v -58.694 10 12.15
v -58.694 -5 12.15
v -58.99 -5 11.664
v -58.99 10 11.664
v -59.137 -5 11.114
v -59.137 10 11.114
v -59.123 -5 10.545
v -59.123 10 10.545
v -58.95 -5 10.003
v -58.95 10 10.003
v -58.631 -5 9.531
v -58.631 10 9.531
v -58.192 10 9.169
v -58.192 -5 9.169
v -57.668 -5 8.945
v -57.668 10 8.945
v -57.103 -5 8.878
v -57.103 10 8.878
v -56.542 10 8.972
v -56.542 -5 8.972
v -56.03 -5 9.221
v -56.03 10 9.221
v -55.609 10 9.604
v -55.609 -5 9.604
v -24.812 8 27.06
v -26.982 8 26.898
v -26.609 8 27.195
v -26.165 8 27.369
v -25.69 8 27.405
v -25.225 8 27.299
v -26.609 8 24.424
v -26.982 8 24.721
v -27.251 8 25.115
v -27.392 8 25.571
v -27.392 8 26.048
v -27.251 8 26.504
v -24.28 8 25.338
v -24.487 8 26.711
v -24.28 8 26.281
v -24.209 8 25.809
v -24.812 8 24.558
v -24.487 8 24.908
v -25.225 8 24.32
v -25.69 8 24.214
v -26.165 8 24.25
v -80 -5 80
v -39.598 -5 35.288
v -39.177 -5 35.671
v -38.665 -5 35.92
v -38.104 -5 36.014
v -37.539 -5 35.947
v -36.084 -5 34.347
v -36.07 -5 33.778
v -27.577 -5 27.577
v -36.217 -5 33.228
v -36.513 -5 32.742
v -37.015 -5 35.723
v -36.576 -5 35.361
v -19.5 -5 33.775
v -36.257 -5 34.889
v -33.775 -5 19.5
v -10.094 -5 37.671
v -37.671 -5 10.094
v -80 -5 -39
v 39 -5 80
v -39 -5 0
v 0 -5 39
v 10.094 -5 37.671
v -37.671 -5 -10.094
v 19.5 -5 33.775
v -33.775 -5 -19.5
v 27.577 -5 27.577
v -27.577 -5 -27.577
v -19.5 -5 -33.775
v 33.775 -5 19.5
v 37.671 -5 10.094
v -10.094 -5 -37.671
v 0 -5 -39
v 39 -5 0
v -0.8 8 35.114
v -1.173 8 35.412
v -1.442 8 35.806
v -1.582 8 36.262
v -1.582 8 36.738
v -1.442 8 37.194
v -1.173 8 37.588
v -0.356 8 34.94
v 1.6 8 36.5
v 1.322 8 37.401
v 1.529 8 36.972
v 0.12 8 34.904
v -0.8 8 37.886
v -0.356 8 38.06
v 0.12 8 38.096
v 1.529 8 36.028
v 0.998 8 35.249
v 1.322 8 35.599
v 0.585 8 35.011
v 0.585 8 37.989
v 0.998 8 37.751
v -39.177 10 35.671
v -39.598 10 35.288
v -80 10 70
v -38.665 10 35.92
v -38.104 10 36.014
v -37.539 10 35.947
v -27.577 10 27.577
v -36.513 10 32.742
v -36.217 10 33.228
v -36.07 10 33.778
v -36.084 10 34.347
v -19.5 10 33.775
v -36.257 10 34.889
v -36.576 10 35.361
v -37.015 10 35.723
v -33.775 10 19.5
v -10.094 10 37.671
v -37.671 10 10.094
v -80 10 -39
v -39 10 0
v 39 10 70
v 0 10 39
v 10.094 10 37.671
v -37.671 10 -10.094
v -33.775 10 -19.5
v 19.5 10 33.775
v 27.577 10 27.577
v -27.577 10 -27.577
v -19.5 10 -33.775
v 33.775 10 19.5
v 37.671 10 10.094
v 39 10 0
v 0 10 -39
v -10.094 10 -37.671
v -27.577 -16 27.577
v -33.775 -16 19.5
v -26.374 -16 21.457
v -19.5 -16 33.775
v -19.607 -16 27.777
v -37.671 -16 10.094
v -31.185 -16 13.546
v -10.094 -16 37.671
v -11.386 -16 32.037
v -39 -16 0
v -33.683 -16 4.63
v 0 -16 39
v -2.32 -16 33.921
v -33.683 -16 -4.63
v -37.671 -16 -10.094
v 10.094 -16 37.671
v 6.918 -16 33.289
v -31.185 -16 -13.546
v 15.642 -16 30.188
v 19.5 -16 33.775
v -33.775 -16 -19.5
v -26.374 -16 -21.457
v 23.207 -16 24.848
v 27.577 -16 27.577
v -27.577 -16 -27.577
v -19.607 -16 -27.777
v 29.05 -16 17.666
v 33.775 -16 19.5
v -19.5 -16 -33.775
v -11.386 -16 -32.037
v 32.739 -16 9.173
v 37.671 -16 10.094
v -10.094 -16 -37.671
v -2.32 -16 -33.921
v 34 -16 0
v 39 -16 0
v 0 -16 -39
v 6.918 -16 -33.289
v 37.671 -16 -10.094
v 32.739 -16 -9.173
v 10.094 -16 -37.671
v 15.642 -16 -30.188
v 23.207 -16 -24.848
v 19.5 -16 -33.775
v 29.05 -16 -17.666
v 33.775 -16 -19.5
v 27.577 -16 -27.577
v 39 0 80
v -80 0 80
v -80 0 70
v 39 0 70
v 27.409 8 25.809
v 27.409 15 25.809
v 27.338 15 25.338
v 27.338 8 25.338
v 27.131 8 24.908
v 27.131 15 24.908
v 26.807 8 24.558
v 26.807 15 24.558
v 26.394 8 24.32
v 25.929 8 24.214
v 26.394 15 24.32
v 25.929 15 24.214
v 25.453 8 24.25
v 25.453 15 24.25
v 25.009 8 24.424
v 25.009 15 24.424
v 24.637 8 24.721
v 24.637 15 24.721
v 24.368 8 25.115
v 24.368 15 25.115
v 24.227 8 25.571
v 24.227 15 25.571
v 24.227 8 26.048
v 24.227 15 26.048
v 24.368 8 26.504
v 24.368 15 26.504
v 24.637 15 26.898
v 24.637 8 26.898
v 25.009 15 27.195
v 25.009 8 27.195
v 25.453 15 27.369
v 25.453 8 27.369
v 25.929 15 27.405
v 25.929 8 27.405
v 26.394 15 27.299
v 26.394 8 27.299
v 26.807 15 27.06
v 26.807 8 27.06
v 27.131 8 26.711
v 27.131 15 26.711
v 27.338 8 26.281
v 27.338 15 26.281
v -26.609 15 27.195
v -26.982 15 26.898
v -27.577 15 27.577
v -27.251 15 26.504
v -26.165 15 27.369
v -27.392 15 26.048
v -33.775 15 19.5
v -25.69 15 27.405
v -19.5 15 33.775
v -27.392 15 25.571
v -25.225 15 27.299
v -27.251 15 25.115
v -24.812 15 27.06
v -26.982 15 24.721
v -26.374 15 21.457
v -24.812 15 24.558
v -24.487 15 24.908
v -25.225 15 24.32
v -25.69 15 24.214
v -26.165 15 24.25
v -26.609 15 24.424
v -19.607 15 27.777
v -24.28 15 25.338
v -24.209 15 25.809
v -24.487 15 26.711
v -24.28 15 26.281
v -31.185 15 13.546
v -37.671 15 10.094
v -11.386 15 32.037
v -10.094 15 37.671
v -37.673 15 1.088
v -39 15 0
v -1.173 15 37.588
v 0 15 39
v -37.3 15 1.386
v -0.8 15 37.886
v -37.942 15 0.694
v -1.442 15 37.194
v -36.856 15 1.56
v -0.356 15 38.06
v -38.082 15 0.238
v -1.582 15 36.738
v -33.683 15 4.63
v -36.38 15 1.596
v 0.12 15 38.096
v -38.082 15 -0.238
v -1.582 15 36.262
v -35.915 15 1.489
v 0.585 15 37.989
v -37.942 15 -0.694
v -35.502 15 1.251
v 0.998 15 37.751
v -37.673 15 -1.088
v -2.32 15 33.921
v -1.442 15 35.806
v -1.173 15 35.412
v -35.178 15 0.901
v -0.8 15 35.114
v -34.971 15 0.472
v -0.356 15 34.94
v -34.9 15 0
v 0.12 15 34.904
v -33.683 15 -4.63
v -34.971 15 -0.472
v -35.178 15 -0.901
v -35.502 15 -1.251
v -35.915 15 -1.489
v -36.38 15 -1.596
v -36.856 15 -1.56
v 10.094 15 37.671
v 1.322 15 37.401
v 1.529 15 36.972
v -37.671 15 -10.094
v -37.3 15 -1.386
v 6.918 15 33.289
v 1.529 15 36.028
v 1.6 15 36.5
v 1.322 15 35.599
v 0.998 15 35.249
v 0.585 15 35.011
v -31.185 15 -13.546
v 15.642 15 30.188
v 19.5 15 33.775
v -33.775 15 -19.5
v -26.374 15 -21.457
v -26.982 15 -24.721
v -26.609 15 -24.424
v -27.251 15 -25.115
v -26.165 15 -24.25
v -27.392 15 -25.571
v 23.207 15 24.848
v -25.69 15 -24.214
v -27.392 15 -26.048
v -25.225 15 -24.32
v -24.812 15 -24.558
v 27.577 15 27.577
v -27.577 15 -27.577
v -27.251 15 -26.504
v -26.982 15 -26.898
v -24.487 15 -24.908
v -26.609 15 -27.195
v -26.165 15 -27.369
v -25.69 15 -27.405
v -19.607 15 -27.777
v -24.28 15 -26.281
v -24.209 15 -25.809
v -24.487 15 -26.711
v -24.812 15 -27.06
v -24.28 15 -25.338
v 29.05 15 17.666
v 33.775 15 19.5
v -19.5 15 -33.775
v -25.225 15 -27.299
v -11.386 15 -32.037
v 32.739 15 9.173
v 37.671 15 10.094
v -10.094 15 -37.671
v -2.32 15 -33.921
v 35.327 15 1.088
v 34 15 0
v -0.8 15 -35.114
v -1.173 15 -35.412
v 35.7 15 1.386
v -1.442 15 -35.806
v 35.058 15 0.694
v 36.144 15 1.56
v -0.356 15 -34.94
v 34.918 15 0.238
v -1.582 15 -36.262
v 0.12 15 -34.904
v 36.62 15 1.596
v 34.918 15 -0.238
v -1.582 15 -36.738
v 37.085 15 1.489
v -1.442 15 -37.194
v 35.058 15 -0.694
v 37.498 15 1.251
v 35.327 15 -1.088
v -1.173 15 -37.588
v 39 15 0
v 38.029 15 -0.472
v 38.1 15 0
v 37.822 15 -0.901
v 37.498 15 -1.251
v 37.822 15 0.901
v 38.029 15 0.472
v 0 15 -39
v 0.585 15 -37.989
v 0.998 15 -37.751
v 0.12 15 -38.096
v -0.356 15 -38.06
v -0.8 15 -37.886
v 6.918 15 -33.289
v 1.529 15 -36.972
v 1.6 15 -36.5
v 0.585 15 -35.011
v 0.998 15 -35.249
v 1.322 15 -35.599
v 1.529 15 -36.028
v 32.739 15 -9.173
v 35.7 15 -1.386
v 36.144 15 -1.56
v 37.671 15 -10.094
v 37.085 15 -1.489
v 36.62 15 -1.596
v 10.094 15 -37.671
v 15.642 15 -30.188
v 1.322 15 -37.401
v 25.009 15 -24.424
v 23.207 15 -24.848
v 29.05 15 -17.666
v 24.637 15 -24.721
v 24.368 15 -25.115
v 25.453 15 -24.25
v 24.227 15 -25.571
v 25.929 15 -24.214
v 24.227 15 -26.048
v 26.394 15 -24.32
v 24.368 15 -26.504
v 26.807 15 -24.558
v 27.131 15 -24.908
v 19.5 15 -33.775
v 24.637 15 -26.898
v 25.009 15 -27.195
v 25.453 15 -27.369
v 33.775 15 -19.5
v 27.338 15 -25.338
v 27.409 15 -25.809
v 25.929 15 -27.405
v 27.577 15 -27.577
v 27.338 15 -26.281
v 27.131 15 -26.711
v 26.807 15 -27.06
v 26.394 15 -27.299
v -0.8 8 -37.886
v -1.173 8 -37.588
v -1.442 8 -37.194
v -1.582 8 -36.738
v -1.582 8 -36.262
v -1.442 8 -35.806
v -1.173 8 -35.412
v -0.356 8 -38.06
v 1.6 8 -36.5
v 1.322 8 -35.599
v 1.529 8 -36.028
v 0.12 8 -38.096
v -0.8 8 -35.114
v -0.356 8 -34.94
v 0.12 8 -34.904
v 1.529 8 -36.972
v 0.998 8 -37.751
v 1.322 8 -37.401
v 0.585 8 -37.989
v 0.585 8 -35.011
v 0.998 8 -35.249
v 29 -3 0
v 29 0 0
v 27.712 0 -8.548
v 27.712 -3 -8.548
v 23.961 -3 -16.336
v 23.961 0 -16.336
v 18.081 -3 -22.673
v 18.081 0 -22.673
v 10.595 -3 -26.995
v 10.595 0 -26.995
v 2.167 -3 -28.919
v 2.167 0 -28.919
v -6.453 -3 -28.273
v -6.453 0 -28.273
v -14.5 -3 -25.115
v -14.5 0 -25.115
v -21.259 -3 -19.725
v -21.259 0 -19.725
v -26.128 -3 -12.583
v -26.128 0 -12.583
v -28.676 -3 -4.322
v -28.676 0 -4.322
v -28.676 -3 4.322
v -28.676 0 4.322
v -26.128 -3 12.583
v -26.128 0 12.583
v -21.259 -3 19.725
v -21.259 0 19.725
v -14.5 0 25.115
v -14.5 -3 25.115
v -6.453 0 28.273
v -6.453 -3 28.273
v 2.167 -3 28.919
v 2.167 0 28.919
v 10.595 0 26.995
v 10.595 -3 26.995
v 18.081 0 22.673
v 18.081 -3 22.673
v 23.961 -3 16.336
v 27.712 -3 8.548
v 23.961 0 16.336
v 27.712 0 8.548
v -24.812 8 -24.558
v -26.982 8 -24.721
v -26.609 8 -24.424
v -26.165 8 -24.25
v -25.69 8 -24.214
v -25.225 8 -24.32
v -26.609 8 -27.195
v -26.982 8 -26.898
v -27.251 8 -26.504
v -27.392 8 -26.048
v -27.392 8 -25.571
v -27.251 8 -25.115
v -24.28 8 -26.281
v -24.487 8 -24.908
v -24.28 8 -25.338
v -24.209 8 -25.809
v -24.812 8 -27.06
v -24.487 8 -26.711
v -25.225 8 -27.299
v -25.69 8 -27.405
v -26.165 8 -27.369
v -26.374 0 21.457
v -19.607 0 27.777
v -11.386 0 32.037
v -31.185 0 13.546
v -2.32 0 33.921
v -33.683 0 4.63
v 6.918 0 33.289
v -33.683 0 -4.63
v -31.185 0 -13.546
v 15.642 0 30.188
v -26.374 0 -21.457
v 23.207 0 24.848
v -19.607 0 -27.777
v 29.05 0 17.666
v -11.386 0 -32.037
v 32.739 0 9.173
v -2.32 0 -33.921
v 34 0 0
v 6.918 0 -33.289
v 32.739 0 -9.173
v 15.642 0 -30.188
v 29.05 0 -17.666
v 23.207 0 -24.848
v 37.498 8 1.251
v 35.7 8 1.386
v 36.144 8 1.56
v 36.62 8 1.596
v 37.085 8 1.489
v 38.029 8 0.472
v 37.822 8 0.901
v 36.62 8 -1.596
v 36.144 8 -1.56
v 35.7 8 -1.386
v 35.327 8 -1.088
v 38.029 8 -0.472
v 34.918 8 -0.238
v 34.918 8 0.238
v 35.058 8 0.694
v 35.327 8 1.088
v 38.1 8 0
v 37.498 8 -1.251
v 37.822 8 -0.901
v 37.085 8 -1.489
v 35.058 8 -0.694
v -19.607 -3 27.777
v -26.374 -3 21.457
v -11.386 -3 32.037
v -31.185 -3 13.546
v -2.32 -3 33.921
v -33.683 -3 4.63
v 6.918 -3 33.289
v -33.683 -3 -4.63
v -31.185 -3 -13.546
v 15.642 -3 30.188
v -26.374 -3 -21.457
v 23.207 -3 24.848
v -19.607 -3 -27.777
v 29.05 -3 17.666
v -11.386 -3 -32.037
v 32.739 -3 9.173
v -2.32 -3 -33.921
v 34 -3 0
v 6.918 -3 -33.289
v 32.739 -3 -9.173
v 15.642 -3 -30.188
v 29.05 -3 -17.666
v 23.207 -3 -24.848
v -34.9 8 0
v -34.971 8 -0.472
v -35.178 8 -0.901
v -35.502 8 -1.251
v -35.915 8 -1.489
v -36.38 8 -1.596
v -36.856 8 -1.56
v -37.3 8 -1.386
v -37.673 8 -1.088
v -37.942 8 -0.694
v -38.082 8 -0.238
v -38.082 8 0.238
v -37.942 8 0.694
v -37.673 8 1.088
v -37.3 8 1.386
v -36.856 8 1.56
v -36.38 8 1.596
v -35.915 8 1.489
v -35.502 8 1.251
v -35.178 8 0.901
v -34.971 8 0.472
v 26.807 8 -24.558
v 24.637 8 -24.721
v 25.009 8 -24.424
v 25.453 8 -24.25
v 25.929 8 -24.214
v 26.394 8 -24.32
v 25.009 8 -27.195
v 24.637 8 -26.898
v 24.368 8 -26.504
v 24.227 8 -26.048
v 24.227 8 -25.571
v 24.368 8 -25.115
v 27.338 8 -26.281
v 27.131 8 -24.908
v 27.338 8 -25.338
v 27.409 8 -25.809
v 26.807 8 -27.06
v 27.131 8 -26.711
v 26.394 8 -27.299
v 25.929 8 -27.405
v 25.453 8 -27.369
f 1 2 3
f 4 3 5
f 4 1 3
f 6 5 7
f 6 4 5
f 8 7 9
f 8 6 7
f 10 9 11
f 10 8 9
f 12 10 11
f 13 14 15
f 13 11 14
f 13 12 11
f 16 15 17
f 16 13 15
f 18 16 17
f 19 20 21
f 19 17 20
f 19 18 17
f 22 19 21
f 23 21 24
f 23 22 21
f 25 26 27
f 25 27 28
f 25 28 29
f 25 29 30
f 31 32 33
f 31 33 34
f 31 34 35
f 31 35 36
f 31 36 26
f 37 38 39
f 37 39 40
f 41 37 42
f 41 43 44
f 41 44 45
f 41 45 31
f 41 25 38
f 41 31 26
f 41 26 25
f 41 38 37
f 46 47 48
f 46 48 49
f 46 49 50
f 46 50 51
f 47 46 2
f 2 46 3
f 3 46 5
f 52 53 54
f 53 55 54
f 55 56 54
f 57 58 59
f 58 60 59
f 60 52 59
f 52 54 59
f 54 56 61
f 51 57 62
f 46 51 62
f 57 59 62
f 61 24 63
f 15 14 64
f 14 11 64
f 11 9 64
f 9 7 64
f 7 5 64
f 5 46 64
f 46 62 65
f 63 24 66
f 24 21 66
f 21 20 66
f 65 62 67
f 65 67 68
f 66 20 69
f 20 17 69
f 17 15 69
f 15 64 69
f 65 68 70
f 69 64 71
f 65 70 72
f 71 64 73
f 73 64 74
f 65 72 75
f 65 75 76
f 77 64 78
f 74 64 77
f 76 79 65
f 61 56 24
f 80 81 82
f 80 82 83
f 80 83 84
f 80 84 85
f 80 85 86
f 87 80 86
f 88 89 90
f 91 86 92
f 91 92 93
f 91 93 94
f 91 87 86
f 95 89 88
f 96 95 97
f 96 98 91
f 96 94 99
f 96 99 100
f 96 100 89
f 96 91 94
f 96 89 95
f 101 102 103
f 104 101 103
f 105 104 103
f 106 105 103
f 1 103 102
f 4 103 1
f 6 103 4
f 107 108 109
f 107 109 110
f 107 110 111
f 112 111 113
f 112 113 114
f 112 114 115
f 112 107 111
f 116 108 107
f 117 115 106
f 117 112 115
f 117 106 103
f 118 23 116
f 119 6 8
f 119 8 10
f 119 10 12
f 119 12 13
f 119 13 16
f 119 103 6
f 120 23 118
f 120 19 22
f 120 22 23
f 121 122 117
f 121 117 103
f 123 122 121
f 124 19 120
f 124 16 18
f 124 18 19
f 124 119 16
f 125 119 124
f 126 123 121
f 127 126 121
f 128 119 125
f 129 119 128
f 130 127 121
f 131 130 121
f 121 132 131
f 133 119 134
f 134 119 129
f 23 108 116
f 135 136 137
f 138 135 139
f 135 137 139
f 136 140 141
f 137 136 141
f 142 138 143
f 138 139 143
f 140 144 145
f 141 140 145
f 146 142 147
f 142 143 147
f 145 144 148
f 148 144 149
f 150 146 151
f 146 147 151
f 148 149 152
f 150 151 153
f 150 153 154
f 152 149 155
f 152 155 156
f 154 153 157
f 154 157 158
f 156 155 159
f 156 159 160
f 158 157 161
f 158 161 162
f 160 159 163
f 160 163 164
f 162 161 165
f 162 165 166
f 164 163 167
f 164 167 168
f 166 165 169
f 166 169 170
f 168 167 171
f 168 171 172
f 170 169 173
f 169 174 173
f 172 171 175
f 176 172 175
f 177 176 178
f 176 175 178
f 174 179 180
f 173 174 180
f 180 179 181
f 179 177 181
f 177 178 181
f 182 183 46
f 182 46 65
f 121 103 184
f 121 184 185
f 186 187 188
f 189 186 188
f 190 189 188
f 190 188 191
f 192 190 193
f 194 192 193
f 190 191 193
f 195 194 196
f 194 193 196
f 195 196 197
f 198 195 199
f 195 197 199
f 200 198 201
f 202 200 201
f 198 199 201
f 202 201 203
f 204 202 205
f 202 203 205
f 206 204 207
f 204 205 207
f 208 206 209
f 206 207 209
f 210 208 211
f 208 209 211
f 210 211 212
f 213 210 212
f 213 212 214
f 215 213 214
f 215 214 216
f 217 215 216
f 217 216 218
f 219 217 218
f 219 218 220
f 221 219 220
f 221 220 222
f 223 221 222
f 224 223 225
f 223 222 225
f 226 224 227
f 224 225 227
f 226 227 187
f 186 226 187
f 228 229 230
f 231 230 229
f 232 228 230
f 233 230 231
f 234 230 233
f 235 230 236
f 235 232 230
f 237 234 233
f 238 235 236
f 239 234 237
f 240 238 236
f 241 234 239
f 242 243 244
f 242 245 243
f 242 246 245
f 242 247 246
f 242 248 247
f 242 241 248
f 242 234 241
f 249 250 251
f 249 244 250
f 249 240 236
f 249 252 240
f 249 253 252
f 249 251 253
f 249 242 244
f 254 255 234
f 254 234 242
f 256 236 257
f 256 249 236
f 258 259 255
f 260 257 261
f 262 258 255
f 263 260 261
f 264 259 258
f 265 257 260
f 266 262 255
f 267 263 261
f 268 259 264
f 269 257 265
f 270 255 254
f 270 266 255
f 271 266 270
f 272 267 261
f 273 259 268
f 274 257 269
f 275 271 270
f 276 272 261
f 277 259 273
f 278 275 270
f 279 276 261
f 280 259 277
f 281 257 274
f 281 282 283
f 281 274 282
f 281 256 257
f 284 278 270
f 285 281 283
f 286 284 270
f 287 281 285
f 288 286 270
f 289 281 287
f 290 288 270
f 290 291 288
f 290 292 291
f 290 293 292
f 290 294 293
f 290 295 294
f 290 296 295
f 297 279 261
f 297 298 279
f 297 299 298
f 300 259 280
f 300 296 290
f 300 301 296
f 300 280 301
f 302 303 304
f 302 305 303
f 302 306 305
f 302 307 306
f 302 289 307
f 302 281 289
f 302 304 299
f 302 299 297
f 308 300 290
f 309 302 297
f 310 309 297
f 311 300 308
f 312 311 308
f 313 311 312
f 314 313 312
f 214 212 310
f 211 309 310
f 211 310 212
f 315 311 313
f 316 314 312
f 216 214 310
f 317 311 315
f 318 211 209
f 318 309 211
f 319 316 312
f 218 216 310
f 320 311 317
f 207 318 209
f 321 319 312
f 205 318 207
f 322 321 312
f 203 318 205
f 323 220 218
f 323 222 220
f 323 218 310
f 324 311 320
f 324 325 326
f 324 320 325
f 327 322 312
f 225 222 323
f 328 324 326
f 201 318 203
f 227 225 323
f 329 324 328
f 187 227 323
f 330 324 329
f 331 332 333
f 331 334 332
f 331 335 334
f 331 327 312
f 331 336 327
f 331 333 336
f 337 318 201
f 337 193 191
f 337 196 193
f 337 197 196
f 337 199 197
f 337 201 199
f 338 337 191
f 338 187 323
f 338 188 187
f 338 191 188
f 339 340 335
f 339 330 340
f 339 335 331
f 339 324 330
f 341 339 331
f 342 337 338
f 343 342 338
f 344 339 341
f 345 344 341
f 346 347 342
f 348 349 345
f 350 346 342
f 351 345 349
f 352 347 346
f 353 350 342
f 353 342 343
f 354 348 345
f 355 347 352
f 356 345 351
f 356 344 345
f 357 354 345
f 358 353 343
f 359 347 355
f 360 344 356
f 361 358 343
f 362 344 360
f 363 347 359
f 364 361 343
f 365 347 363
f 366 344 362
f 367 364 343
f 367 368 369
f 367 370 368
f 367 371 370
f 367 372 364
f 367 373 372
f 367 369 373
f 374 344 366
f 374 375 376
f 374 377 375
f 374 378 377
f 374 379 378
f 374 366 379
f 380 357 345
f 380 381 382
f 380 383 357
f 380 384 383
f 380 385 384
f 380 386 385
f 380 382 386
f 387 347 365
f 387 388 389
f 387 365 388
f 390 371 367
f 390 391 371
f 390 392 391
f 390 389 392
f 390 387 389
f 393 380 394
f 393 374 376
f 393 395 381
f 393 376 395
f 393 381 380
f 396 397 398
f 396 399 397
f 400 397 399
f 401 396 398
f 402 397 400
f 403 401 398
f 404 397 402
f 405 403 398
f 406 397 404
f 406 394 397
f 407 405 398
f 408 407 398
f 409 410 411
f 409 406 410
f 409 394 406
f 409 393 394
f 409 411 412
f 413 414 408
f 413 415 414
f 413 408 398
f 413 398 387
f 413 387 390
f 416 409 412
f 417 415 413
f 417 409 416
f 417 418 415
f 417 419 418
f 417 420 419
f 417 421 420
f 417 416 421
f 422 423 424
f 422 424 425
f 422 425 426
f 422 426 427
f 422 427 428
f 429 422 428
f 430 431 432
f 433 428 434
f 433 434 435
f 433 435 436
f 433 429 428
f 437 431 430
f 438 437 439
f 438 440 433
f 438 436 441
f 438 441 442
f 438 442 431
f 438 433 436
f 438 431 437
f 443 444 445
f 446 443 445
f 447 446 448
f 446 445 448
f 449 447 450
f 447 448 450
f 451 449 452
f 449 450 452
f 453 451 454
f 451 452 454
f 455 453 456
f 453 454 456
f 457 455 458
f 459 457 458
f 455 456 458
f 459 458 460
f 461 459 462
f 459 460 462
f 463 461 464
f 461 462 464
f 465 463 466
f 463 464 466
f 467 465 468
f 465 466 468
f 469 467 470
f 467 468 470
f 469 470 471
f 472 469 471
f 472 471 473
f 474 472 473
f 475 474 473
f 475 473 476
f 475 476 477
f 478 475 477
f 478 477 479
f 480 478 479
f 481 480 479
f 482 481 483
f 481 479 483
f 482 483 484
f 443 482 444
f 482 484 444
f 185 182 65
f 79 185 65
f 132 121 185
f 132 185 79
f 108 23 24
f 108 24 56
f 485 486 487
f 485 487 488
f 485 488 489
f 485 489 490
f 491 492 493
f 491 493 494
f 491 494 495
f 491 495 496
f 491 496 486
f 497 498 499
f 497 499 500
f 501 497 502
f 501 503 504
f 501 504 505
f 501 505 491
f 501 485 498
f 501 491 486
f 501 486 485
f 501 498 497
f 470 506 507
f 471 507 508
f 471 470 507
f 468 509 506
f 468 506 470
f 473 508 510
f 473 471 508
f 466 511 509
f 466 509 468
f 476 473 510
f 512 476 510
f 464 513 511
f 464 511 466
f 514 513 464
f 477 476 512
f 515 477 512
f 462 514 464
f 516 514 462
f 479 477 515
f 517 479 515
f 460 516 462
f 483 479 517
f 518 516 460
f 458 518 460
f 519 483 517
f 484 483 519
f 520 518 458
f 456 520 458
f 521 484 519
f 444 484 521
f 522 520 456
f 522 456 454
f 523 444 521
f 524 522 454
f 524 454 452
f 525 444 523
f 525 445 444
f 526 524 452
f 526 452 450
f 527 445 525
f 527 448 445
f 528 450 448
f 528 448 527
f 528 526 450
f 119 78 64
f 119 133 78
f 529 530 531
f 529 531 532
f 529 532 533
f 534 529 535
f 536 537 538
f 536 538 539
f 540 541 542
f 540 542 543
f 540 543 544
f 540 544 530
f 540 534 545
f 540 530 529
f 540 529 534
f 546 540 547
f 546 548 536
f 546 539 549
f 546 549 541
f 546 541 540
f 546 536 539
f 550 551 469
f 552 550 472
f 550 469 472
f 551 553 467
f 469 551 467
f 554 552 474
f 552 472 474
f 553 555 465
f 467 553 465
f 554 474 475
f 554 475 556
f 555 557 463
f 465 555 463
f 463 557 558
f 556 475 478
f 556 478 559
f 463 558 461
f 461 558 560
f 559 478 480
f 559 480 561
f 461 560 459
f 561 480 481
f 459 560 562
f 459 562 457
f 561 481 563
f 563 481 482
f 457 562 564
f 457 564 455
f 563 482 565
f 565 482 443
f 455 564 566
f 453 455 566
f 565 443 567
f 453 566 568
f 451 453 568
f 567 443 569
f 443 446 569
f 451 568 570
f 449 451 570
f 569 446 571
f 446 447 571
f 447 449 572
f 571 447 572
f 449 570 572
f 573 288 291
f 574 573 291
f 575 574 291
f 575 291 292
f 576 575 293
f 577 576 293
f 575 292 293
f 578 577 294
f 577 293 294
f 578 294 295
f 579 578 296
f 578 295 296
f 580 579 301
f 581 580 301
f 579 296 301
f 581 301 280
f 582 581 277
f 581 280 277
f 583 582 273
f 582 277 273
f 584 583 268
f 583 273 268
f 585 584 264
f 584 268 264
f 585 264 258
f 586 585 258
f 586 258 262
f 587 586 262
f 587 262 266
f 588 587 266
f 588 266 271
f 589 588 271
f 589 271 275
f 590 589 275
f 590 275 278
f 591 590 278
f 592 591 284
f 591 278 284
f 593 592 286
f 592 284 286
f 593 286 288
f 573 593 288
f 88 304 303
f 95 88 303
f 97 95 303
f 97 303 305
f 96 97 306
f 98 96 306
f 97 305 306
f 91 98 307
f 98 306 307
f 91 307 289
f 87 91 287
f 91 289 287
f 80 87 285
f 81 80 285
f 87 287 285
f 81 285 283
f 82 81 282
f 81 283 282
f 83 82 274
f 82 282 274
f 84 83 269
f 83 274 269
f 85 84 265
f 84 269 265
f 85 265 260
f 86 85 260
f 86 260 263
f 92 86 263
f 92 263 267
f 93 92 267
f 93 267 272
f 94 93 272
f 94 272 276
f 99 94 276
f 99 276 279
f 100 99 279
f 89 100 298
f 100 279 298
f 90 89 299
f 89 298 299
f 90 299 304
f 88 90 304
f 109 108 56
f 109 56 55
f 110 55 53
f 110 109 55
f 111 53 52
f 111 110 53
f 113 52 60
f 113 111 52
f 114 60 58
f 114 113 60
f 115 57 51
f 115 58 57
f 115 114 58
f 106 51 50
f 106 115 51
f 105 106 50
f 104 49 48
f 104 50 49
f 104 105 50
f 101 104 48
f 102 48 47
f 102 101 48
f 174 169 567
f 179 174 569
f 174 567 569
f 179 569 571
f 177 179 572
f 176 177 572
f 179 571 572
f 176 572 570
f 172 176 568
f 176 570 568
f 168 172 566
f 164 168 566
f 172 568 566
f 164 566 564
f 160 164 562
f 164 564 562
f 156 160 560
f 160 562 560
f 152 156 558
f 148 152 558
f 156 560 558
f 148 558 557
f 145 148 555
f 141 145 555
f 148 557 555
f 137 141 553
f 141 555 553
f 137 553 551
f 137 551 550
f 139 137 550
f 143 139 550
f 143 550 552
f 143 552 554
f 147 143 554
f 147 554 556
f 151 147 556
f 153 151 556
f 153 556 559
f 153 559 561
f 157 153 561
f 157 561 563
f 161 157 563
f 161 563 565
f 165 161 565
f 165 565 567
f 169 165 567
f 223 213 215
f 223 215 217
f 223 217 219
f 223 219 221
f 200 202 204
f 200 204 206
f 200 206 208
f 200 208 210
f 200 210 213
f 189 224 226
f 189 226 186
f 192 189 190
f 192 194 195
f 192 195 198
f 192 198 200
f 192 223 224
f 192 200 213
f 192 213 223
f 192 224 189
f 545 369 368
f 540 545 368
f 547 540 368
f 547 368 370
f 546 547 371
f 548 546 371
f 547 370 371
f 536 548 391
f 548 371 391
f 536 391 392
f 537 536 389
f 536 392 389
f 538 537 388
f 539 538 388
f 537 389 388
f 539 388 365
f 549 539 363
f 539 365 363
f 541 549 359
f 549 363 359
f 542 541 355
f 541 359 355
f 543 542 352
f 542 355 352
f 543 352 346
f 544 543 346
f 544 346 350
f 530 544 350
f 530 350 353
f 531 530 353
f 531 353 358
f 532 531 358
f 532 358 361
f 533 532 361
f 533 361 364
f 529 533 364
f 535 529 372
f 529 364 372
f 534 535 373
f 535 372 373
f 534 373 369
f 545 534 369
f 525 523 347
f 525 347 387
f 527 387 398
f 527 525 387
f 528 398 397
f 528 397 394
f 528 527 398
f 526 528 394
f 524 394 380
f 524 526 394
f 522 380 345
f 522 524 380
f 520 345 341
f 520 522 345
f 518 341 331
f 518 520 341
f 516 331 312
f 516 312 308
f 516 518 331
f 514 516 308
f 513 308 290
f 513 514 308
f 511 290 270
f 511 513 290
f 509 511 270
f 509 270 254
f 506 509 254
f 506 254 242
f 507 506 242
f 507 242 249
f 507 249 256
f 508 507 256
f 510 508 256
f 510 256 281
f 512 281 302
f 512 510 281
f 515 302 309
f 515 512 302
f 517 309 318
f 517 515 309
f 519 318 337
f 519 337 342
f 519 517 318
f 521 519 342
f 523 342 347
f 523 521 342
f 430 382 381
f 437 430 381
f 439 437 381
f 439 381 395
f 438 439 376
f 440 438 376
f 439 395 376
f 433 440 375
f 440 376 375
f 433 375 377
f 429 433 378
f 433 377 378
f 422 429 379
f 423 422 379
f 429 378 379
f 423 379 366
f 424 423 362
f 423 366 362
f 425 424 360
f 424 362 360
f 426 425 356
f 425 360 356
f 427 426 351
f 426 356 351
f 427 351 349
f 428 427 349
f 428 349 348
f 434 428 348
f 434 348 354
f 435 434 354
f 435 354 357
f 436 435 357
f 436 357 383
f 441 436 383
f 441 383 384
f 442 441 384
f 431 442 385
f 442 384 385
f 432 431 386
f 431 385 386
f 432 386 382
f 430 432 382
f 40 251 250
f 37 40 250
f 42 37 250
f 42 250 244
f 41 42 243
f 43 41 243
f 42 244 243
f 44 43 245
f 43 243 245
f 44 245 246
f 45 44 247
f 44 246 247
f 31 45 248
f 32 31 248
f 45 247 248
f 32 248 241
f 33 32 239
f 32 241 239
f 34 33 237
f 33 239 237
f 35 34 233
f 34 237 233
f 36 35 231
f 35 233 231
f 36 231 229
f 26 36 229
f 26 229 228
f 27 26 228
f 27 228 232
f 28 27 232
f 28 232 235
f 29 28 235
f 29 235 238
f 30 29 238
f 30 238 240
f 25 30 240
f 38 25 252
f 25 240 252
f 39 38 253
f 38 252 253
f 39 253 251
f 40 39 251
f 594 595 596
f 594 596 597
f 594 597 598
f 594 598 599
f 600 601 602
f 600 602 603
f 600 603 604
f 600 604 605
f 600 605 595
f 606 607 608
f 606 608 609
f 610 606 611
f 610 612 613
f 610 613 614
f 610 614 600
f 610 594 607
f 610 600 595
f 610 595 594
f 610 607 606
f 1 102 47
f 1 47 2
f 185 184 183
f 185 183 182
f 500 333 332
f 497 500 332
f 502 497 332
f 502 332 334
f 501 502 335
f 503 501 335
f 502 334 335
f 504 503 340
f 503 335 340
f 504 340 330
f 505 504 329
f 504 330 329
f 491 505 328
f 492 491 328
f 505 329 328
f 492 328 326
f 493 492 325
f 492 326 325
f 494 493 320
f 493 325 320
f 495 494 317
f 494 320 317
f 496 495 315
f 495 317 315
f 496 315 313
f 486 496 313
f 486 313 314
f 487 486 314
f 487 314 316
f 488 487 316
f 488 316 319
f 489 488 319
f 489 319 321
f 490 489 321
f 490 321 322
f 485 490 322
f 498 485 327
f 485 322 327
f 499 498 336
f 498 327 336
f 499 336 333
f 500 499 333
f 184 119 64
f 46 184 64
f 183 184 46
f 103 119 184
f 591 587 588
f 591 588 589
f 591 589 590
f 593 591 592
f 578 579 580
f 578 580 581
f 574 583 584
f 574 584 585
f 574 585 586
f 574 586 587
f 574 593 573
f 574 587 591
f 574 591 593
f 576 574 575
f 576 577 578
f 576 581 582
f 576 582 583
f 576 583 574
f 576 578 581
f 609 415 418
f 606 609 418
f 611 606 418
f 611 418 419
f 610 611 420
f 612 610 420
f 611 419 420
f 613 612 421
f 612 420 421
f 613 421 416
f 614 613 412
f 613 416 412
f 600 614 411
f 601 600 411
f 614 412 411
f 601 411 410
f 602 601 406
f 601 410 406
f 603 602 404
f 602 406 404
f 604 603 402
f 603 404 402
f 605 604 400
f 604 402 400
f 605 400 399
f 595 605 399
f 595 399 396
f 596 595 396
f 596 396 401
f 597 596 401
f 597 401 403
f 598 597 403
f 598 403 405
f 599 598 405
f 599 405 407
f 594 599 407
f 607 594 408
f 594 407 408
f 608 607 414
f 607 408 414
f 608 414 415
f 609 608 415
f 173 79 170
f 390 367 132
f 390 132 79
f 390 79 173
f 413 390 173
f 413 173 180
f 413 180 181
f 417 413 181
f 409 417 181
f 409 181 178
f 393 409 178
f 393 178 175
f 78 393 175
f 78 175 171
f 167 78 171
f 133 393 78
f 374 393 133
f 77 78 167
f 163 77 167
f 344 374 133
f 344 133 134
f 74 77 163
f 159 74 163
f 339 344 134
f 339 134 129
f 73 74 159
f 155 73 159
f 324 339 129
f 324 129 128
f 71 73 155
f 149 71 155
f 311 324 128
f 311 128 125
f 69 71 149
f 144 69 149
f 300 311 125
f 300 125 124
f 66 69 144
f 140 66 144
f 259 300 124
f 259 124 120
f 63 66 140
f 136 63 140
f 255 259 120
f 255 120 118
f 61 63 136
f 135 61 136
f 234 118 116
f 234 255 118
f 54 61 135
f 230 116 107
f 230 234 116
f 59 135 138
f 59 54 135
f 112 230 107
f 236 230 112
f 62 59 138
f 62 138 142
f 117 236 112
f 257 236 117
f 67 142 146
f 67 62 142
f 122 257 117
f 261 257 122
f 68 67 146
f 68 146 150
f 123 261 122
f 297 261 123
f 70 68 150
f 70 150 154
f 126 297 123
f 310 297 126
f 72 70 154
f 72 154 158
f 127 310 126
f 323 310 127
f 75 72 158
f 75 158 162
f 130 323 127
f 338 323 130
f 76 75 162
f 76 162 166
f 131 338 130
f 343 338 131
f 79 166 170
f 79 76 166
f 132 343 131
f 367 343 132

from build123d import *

# Parameters (mm, degrees)
SKETCH2_R                = 34
BOSS_EXTRUDE1_DEPTH      = 15
BOSS_EXTRUDE2_START      = -3
SKETCH2_3_R              = 39
SKETCH2_3_R_2            = 29
BOSS_EXTRUDE2_DEPTH      = 3
BOSS_EXTRUDE3_START      = -16
SKETCH2_4_R              = 34
BOSS_EXTRUDE3_DEPTH      = 16
BOSS_EXTRUDE4_DEPTH      = 10
BOSS_EXTRUDE4_DEPTH_BACK = 5
SKETCH3_W                = 119
SKETCH3_H                = 10
CUT_EXTRUDE1_DEPTH       = 10
SKETCH4_R                = 1.6
CUT_EXTRUDE2_DEPTH       = 7
CUT_EXTRUDE3_DEPTH       = 117.086174887


with BuildPart() as part:
    # Sketch2 → Boss-Extrude1 (new body)
    with BuildSketch(Plane(origin=(0, 0, 0), x_dir=(1, 0, 0), z_dir=(0, 1, 0))):
        with BuildLine():
            ThreePointArc((39, 0), (27.577164466, 27.577164466), (0, 39))
            ThreePointArc((0, 39), (-27.577164466, -27.577164466), (39, 0))
        make_face()
        Circle(SKETCH2_R, mode=Mode.SUBTRACT)
    extrude(amount=BOSS_EXTRUDE1_DEPTH)

    # Sketch2<3> → Boss-Extrude2 (add)
    with BuildSketch(Plane(origin=(0, 0, 0), x_dir=(1, 0, 0), z_dir=(0, 1, 0)).offset(BOSS_EXTRUDE2_START)):
        Circle(SKETCH2_3_R)
        Circle(SKETCH2_3_R_2, mode=Mode.SUBTRACT)
    extrude(amount=BOSS_EXTRUDE2_DEPTH)

    # Sketch2<4> → Boss-Extrude3 (add)
    with BuildSketch(Plane(origin=(0, 0, 0), x_dir=(1, 0, 0), z_dir=(0, 1, 0)).offset(BOSS_EXTRUDE3_START)):
        with BuildLine():
            ThreePointArc((39, 0), (27.577164466, 27.577164466), (0, 39))
            ThreePointArc((0, 39), (-27.577164466, -27.577164466), (39, 0))
        make_face()
        Circle(SKETCH2_4_R, mode=Mode.SUBTRACT)
    extrude(amount=BOSS_EXTRUDE3_DEPTH)

    # Sketch2<6> → Boss-Extrude4 (add, two sides: drawn at the far end of the back side and taken through both)
    with BuildSketch(Plane(origin=(0, 0, 0), x_dir=(1, 0, 0), z_dir=(0, 1, 0)).offset(-BOSS_EXTRUDE4_DEPTH_BACK)):
        with BuildLine():
            ThreePointArc((39, 0), (-27.577164466, -27.577164466), (0, 39))
            Line((0, 39), (-80, 39))
            Line((-80, 39), (-80, -80))
            Line((-80, -80), (0, -80))
            Line((0, -80), (39, -80))
            Line((39, -80), (39, 0))
        make_face()
    extrude(amount=BOSS_EXTRUDE4_DEPTH + BOSS_EXTRUDE4_DEPTH_BACK)

    # Sketch3 → Cut-Extrude1 (cut)
    with BuildSketch(Plane(origin=(0, 10, 0), x_dir=(1, 0, 0), z_dir=(0, 1, 0))):
        with Locations((-20.5, -75)):
            Rectangle(SKETCH3_W, SKETCH3_H)
    extrude(amount=-CUT_EXTRUDE1_DEPTH, mode=Mode.SUBTRACT)

    # Sketch4 → Cut-Extrude2 (cut)
    with BuildSketch(Plane(origin=(0, 15, 0), x_dir=(1, 0, 0), z_dir=(0, 1, 0))):
        with Locations((0, 36.5)):
            Circle(SKETCH4_R)
        with Locations((25.809397513, 25.809397513)):
            Circle(SKETCH4_R)
        with Locations((36.5, 0)):
            Circle(SKETCH4_R)
        with Locations((25.809397513, -25.809397513)):
            Circle(SKETCH4_R)
        with Locations((0, -36.5)):
            Circle(SKETCH4_R)
        with Locations((-25.809397513, -25.809397513)):
            Circle(SKETCH4_R)
        with Locations((-36.5, 0)):
            Circle(SKETCH4_R)
        with Locations((-25.809397513, 25.809397513)):
            Circle(SKETCH4_R)
    extrude(amount=-CUT_EXTRUDE2_DEPTH, mode=Mode.SUBTRACT)

    # Sketch5 → Cut-Extrude3 (cut, through all)
    with BuildSketch(Plane(origin=(0, 10, 0), x_dir=(1, 0, 0), z_dir=(0, 1, 0))):
        with BuildLine():
            Line((-55.608568551, -9.603906759), (-36.513231213, -32.741929405))
            ThreePointArc((-36.513231213, -32.741929405), (-36.782743567, -35.557486737), (-39.598300899, -35.287974383))
            Line((-39.598300899, -35.287974383), (-58.693638237, -12.149951738))
            ThreePointArc((-58.693638237, -12.149951738), (-58.424125883, -9.334394405), (-55.608568551, -9.603906759))
        make_face()
    extrude(amount=-CUT_EXTRUDE3_DEPTH, mode=Mode.SUBTRACT)


solid = part.part
